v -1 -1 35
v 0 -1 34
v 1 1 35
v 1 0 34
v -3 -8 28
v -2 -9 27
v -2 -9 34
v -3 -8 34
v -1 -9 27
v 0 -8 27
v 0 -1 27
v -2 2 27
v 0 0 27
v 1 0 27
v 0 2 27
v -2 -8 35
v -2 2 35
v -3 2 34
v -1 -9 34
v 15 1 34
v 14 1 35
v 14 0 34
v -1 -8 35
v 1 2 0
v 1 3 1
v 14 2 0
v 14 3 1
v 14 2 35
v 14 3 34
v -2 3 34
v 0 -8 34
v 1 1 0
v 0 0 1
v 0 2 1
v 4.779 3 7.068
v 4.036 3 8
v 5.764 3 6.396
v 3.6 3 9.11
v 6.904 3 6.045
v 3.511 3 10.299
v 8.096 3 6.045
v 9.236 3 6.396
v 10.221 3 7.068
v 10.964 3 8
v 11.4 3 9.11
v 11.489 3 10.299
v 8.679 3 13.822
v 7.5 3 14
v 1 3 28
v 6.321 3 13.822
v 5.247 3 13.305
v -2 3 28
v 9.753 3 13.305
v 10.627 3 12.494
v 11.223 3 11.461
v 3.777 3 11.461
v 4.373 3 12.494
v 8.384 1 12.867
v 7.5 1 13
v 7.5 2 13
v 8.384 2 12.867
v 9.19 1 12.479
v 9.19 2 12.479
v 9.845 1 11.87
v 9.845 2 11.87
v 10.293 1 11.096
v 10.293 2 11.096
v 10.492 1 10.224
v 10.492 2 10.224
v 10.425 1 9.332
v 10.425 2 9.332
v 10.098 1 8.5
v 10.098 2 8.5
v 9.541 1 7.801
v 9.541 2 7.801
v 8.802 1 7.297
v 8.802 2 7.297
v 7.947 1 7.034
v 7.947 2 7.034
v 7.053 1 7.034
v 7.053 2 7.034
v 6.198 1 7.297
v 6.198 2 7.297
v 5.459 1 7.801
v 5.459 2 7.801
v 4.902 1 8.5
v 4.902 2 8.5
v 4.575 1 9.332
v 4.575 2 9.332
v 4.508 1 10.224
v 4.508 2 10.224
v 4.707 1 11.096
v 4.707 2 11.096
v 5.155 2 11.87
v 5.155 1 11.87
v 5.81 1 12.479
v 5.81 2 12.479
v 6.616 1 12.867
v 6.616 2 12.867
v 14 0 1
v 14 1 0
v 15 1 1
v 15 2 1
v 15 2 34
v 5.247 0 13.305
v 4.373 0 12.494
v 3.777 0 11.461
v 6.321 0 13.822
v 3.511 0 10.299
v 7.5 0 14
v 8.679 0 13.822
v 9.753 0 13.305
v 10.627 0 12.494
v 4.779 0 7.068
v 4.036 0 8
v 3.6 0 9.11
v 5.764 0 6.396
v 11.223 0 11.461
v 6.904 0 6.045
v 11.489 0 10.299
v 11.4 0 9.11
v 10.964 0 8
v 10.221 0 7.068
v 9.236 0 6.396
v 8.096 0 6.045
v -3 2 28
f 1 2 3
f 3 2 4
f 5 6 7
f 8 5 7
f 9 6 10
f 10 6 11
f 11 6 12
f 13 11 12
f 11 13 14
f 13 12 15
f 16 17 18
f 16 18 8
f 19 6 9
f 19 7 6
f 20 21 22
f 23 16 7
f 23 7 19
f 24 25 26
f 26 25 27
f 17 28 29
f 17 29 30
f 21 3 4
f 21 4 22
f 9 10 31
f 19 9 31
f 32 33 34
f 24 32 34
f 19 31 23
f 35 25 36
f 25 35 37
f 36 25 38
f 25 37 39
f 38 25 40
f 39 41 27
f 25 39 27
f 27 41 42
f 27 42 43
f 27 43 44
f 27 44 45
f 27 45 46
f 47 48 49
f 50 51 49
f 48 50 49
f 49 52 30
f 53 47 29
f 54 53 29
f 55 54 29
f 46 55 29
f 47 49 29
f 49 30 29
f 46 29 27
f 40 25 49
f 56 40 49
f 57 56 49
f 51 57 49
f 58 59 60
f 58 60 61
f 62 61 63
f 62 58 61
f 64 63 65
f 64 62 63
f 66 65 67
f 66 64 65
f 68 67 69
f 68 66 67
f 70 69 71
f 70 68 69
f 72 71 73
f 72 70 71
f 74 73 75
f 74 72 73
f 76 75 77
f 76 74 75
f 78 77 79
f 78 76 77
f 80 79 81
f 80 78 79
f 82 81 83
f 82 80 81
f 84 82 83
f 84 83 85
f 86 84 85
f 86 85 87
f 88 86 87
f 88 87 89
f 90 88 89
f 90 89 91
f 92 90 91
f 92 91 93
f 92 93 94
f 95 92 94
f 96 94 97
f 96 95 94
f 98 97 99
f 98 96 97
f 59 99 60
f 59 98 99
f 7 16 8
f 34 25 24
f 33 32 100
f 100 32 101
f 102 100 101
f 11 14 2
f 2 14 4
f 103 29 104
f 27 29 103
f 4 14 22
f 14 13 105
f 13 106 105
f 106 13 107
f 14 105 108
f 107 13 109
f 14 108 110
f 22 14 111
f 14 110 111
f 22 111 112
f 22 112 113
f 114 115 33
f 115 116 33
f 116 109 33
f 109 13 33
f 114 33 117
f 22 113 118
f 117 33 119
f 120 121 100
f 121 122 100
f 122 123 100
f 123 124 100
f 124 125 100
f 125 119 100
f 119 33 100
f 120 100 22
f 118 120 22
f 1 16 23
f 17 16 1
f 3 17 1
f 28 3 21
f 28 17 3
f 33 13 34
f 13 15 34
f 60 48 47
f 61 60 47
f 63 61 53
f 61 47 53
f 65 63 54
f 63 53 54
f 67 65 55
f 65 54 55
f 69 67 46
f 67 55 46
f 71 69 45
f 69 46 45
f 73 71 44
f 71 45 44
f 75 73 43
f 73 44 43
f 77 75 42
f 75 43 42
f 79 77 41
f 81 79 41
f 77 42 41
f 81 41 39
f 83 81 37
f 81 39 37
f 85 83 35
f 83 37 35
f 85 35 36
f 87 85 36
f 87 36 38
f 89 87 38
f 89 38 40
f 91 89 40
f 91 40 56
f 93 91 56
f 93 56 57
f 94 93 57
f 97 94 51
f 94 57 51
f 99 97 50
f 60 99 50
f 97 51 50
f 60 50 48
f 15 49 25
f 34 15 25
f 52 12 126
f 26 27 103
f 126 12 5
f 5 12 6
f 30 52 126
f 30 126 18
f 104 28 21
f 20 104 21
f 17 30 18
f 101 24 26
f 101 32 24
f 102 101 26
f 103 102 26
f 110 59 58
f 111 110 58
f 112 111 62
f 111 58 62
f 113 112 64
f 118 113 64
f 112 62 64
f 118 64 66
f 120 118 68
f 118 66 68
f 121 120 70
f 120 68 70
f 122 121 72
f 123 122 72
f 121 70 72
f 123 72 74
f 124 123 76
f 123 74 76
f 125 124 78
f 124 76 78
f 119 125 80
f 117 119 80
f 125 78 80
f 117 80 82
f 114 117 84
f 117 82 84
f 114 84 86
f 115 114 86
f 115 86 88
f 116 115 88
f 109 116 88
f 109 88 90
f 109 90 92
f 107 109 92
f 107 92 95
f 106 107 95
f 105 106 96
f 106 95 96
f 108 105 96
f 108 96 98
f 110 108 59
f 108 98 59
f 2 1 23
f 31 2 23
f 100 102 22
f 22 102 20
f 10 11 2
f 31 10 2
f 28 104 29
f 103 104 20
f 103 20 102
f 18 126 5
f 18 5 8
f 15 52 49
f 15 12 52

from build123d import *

# Parameters (mm, degrees)
SKETCH_1_W           = 15
SKETCH_1_H           = 20
SKETCH_1_R           = 3
EXTRUDE_1_DEPTH      = 3
SKETCH_2_W           = 15
SKETCH_2_H           = 15
EXTRUDE_2_DEPTH      = 3
EXTRUDE_3_DEPTH      = 9
EXTRUDE_3_DEPTH_BACK = 3
SKETCH_4_W           = 3
SKETCH_4_H           = 8
CHAMFER_1_SIZE       = 1


with BuildPart() as part:
    # 草图1 → 凸台-拉伸1 (new body)
    with BuildSketch(Plane(origin=(0, 0, 0), x_dir=(1, 0, 0), z_dir=(0, 1, 0))):
        with Locations((7.5, -10)):
            Rectangle(SKETCH_1_W, SKETCH_1_H)
        with Locations(Location((7.5, -10, 0), (0, 0, 270))):
            Circle(SKETCH_1_R, mode=Mode.SUBTRACT)
    extrude(amount=EXTRUDE_1_DEPTH)

    # 草图2 → 凸台-拉伸2 (add)
    with BuildSketch(Plane(origin=(0, 3, 0), x_dir=(1, 0, 0), z_dir=(0, 1, 0))):
        with Locations((7.5, -27.5)):
            Rectangle(SKETCH_2_W, SKETCH_2_H)
    extrude(amount=-EXTRUDE_2_DEPTH)

    # 草图4 → 凸台-拉伸3 (add, two sides: drawn at the far end of the back side and taken through both)
    with BuildSketch(Plane.XZ.offset(-EXTRUDE_3_DEPTH_BACK)):
        with Locations((-1.5, 31)):
            Rectangle(SKETCH_4_W, SKETCH_4_H)
    extrude(amount=EXTRUDE_3_DEPTH + EXTRUDE_3_DEPTH_BACK)

    # 倒角1
    chamfer_1_edges = [part.edges().sort_by_distance(p)[0] for p in [
        (7.5, 0, 7),
        (7.5, 3, 7),
        (15, 3, 17.5),
        (7.5, 3, 0),
        (7.5, 0, 35),
        (15, 1.5, 35),
        (6, 3, 35),
        (0, 0, 31),
        (0, -4.5, 35),
        (-1.5, 3, 27),
        (-3, -3, 27),
        (-3, 3, 31),
        (-3, -3, 35),
        (0, -9, 31),
        (-1.5, -9, 35),
        (-3, -9, 31),
        (0, 3, 13.5),
        (7.5, 0, 0),
        (15, 0, 17.5),
        (0, 1.5, 0),
        (15, 1.5, 0),
    ]]
    chamfer(chamfer_1_edges, length=CHAMFER_1_SIZE)


solid = part.part
